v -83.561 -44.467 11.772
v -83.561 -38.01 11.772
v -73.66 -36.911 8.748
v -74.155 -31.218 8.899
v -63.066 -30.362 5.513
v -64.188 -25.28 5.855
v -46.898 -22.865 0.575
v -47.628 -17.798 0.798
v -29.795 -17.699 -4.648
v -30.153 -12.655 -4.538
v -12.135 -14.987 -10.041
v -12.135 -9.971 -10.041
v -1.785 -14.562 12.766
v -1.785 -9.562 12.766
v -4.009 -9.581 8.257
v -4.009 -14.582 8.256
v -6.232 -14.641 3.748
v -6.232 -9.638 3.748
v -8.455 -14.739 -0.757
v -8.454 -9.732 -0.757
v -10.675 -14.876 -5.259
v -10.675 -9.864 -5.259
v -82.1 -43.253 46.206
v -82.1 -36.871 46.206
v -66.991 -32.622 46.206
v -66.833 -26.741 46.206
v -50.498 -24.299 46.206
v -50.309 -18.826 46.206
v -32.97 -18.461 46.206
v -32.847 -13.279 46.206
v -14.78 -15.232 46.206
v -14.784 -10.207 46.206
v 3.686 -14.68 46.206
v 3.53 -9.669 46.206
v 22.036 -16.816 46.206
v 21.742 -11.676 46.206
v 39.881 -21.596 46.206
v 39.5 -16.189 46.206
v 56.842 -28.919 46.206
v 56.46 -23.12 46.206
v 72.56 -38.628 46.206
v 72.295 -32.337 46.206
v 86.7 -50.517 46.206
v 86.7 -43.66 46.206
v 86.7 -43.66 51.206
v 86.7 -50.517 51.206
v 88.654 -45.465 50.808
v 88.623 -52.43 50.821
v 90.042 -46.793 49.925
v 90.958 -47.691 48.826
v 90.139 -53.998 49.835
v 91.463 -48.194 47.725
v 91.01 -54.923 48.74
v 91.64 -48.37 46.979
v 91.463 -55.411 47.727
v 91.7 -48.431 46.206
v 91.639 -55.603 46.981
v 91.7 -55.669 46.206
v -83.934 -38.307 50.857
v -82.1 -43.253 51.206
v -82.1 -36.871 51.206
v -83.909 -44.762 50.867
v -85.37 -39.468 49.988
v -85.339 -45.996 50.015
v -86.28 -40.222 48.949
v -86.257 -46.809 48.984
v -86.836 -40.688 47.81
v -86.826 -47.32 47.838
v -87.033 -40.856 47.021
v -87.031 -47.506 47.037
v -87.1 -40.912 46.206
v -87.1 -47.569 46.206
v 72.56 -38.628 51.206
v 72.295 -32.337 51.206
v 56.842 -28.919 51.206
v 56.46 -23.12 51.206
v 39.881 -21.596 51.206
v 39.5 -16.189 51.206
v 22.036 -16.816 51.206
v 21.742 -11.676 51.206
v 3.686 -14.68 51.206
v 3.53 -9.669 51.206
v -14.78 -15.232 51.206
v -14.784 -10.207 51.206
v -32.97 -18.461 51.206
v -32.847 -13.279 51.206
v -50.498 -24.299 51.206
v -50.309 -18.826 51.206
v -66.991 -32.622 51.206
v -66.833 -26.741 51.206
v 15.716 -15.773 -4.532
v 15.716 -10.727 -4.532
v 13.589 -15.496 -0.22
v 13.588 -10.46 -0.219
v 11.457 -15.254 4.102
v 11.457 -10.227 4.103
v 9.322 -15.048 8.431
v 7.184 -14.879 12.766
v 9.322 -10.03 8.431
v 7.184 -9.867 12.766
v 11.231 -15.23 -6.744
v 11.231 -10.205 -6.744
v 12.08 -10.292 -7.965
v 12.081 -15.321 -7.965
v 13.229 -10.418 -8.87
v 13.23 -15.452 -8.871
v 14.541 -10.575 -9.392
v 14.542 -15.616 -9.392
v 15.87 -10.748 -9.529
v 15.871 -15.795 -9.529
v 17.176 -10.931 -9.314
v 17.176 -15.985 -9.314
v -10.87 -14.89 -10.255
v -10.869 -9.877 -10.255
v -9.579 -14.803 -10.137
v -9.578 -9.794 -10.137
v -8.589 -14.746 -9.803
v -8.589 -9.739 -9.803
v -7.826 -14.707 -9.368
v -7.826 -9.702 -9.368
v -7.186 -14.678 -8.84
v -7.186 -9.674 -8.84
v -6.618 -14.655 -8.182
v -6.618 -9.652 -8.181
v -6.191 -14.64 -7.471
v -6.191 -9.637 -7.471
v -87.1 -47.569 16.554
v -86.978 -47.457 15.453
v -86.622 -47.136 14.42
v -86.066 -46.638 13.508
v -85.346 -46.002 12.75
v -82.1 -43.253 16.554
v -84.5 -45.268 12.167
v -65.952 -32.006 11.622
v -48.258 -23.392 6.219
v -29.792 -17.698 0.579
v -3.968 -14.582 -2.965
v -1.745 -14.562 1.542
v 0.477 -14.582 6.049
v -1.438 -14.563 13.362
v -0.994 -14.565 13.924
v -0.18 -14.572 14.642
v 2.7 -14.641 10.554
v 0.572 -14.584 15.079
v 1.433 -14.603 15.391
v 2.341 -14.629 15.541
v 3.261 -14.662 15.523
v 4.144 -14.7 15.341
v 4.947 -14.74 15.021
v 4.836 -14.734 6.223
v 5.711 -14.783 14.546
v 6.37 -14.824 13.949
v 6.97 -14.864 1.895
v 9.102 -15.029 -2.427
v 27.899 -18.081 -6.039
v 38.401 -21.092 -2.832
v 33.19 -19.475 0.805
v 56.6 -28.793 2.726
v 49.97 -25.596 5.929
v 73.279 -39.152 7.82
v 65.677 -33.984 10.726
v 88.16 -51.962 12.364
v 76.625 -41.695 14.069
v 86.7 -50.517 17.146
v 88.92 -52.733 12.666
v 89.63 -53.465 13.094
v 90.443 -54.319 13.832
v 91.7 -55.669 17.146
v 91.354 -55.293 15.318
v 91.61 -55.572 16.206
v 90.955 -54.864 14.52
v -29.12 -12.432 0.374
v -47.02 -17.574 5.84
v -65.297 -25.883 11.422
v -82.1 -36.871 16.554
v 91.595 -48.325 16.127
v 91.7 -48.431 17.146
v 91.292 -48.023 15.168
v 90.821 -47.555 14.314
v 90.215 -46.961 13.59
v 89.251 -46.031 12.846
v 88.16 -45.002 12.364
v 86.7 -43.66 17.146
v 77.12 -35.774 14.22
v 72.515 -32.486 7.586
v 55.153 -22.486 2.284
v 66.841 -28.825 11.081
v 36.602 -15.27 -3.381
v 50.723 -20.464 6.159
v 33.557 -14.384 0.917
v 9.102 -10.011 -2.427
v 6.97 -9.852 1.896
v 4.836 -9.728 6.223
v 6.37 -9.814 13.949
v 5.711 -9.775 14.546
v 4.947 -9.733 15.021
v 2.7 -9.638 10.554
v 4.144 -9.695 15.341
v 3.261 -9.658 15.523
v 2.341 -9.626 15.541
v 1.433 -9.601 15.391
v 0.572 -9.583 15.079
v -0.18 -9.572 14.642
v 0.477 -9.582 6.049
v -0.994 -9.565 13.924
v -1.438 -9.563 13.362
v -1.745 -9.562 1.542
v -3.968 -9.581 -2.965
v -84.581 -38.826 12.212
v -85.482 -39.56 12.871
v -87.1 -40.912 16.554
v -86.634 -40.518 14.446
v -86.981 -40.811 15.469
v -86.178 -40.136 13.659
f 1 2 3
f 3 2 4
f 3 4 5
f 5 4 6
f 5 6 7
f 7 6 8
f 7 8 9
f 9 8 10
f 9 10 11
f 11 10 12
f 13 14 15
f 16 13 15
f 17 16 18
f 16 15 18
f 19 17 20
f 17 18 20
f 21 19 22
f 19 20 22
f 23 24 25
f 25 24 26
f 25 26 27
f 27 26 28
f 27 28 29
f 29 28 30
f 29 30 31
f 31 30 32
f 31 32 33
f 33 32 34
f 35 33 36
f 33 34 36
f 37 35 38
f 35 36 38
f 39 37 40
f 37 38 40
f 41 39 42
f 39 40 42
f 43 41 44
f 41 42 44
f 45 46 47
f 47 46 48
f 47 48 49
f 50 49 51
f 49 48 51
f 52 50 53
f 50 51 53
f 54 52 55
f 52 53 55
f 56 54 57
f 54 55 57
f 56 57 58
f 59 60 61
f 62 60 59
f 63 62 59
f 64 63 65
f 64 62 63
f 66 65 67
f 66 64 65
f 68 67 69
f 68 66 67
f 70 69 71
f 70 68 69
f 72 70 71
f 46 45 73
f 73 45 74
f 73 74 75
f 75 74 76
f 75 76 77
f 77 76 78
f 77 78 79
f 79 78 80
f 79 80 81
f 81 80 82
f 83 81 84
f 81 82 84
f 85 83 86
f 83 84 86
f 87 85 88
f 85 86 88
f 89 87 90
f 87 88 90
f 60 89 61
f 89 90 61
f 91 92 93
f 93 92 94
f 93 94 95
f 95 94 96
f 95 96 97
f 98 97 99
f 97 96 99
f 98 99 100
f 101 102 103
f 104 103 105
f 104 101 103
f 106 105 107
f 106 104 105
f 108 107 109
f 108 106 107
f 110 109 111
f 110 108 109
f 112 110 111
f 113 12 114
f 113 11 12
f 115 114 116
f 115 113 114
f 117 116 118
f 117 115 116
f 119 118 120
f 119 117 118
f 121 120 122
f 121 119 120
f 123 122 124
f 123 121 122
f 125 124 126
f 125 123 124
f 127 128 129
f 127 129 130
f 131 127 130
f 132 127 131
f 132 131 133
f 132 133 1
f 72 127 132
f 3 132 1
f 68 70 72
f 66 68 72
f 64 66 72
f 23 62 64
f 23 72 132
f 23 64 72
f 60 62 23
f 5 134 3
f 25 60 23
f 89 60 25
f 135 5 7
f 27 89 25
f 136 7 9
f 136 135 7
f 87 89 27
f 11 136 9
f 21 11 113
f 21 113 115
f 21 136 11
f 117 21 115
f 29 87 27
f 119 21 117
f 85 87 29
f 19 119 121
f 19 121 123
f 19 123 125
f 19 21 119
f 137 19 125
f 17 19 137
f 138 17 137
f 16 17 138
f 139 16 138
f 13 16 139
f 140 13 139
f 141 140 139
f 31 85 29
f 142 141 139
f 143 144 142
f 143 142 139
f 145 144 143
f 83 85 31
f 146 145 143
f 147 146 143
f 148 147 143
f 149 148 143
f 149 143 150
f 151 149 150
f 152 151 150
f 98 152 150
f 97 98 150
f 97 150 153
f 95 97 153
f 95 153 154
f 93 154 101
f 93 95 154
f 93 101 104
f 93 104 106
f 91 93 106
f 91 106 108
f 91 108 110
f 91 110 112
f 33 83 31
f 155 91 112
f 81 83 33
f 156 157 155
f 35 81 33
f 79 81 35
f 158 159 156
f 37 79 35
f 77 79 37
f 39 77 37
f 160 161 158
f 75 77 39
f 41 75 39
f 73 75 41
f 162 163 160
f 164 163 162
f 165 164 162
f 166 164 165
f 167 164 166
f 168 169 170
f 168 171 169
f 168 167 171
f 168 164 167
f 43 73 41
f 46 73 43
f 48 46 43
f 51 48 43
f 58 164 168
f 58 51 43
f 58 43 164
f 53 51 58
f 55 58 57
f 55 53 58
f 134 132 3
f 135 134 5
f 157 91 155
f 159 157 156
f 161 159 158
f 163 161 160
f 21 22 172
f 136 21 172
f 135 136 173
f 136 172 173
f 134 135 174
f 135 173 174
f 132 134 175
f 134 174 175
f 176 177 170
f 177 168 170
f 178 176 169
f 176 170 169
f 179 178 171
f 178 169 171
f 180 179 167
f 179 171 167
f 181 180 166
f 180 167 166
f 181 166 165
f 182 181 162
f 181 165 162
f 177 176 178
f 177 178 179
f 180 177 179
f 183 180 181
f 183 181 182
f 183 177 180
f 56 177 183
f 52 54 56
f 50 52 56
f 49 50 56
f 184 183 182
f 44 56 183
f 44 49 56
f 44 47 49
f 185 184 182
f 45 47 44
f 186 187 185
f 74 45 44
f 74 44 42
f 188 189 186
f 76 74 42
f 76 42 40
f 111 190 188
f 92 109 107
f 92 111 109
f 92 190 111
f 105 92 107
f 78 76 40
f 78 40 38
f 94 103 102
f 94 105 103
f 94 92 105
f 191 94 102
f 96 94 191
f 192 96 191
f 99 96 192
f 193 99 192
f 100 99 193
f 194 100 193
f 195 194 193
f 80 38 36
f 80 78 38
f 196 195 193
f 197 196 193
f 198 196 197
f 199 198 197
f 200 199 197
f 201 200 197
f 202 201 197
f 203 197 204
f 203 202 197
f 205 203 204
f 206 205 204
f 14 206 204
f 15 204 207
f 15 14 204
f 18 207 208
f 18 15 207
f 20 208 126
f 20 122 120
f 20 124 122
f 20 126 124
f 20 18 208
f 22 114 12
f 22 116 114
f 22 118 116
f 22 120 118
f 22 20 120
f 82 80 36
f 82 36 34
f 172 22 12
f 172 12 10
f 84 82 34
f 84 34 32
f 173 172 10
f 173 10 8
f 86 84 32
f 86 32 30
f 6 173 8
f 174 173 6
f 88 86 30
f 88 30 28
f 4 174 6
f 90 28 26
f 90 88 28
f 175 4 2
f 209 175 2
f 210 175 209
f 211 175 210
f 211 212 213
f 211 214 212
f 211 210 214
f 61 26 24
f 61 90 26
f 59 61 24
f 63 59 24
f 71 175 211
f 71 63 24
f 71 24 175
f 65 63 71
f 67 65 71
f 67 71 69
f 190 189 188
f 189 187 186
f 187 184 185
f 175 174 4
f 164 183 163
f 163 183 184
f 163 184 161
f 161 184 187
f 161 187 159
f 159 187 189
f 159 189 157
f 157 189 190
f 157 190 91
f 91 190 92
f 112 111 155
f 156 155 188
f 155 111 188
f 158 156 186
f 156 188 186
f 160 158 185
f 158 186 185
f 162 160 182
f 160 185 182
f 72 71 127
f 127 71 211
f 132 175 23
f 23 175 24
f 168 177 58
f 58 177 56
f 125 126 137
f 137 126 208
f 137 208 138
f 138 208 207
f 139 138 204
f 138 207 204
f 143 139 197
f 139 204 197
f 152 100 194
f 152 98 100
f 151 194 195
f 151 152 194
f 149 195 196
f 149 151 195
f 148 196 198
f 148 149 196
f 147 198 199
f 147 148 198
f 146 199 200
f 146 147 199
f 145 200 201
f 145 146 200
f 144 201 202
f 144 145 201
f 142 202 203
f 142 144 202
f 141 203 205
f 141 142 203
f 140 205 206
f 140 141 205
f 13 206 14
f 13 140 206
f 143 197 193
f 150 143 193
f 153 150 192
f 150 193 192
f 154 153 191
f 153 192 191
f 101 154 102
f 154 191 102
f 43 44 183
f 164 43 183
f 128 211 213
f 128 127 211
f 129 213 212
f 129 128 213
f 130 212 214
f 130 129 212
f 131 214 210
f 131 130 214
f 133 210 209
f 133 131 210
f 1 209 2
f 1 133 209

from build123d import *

# Parameters (mm, degrees)
F1_DEPTH = 150
F3_DEPTH = 200
F5_DEPTH = 100
F6_R     = 5
F7_R     = 5
F8_R     = 5
F9_R     = 5
F10_R    = 5
F11_R    = 5
F12_R    = 5


with BuildPart() as f1:
    # F0 (on Front) → F1 (new body)
    with BuildSketch(Plane.XZ):
        Polygon((2.699633, 10.554306), (13.111226, -10.555131), (91.699633, 13.444814), (91.699633, 51.205629), (2.699633, 51.205629), (-87.100367, 51.205629), (-87.100367, 12.852651), (-8.070518, -11.282105), align=None)
    extrude(amount=F1_DEPTH)

    # F2 (on face) → F3 (cut)
    with BuildSketch(Plane(origin=(0, 0, 0), x_dir=(-1, 0, 0), z_dir=(0, 1, 0))):
        Polygon((10.674811, -5.258827), (82.100367, 16.55367), (82.100367, 46.205629), (-86.699632, 46.205629), (-86.699632, 17.145834), (-15.715518, -4.531853), (-2.699633, 21.857769), align=None)
    extrude(amount=-F3_DEPTH, mode=Mode.SUBTRACT)

    # F4 (on face) → F5 (intersect)
    with BuildSketch(Plane.XY.offset(51.205629)):
        with BuildLine():
            Line((105.917034, -74.399856), (110.162811, -71.75914))
            ThreePointArc((110.162811, -71.75914), (-2.511346, -9.56452), (-114.475567, -73.028285))
            Line((-114.475567, -73.028285), (-110.200224, -75.620859))
            ThreePointArc((-110.200224, -75.620859), (-2.483098, -14.564441), (105.917034, -74.399856))
        make_face()
    extrude(amount=-F5_DEPTH, mode=Mode.INTERSECT)

    # F6
    f6_edges = [f1.edges().sort_by_distance(p)[0] for p in [
        (2.699633, -12.139598, 21.857769),
    ]]
    fillet(f6_edges, radius=F6_R)

    # F7
    f7_edges = [f1.edges().sort_by_distance(p)[0] for p in [
        (-8.070518, -12.216219, -11.282105),
    ]]
    fillet(f7_edges, radius=F7_R)

    # F8
    f8_edges = [f1.edges().sort_by_distance(p)[0] for p in [
        (13.111226, -12.92147, -10.555131),
    ]]
    fillet(f8_edges, radius=F8_R)

    # F9
    f9_edges = [f1.edges().sort_by_distance(p)[0] for p in [
        (-87.100367, -44.240648, 51.205629),
    ]]
    fillet(f9_edges, radius=F9_R)

    # F10
    f10_edges = [f1.edges().sort_by_distance(p)[0] for p in [
        (-87.100367, -44.240648, 12.852651),
    ]]
    fillet(f10_edges, radius=F10_R)

    # F11
    f11_edges = [f1.edges().sort_by_distance(p)[0] for p in [
        (91.699633, -52.049978, 51.205629),
    ]]
    fillet(f11_edges, radius=F11_R)

    # F12
    f12_edges = [f1.edges().sort_by_distance(p)[0] for p in [
        (91.699633, -52.049978, 13.444814),
    ]]
    fillet(f12_edges, radius=F12_R)


solid = f1.part
